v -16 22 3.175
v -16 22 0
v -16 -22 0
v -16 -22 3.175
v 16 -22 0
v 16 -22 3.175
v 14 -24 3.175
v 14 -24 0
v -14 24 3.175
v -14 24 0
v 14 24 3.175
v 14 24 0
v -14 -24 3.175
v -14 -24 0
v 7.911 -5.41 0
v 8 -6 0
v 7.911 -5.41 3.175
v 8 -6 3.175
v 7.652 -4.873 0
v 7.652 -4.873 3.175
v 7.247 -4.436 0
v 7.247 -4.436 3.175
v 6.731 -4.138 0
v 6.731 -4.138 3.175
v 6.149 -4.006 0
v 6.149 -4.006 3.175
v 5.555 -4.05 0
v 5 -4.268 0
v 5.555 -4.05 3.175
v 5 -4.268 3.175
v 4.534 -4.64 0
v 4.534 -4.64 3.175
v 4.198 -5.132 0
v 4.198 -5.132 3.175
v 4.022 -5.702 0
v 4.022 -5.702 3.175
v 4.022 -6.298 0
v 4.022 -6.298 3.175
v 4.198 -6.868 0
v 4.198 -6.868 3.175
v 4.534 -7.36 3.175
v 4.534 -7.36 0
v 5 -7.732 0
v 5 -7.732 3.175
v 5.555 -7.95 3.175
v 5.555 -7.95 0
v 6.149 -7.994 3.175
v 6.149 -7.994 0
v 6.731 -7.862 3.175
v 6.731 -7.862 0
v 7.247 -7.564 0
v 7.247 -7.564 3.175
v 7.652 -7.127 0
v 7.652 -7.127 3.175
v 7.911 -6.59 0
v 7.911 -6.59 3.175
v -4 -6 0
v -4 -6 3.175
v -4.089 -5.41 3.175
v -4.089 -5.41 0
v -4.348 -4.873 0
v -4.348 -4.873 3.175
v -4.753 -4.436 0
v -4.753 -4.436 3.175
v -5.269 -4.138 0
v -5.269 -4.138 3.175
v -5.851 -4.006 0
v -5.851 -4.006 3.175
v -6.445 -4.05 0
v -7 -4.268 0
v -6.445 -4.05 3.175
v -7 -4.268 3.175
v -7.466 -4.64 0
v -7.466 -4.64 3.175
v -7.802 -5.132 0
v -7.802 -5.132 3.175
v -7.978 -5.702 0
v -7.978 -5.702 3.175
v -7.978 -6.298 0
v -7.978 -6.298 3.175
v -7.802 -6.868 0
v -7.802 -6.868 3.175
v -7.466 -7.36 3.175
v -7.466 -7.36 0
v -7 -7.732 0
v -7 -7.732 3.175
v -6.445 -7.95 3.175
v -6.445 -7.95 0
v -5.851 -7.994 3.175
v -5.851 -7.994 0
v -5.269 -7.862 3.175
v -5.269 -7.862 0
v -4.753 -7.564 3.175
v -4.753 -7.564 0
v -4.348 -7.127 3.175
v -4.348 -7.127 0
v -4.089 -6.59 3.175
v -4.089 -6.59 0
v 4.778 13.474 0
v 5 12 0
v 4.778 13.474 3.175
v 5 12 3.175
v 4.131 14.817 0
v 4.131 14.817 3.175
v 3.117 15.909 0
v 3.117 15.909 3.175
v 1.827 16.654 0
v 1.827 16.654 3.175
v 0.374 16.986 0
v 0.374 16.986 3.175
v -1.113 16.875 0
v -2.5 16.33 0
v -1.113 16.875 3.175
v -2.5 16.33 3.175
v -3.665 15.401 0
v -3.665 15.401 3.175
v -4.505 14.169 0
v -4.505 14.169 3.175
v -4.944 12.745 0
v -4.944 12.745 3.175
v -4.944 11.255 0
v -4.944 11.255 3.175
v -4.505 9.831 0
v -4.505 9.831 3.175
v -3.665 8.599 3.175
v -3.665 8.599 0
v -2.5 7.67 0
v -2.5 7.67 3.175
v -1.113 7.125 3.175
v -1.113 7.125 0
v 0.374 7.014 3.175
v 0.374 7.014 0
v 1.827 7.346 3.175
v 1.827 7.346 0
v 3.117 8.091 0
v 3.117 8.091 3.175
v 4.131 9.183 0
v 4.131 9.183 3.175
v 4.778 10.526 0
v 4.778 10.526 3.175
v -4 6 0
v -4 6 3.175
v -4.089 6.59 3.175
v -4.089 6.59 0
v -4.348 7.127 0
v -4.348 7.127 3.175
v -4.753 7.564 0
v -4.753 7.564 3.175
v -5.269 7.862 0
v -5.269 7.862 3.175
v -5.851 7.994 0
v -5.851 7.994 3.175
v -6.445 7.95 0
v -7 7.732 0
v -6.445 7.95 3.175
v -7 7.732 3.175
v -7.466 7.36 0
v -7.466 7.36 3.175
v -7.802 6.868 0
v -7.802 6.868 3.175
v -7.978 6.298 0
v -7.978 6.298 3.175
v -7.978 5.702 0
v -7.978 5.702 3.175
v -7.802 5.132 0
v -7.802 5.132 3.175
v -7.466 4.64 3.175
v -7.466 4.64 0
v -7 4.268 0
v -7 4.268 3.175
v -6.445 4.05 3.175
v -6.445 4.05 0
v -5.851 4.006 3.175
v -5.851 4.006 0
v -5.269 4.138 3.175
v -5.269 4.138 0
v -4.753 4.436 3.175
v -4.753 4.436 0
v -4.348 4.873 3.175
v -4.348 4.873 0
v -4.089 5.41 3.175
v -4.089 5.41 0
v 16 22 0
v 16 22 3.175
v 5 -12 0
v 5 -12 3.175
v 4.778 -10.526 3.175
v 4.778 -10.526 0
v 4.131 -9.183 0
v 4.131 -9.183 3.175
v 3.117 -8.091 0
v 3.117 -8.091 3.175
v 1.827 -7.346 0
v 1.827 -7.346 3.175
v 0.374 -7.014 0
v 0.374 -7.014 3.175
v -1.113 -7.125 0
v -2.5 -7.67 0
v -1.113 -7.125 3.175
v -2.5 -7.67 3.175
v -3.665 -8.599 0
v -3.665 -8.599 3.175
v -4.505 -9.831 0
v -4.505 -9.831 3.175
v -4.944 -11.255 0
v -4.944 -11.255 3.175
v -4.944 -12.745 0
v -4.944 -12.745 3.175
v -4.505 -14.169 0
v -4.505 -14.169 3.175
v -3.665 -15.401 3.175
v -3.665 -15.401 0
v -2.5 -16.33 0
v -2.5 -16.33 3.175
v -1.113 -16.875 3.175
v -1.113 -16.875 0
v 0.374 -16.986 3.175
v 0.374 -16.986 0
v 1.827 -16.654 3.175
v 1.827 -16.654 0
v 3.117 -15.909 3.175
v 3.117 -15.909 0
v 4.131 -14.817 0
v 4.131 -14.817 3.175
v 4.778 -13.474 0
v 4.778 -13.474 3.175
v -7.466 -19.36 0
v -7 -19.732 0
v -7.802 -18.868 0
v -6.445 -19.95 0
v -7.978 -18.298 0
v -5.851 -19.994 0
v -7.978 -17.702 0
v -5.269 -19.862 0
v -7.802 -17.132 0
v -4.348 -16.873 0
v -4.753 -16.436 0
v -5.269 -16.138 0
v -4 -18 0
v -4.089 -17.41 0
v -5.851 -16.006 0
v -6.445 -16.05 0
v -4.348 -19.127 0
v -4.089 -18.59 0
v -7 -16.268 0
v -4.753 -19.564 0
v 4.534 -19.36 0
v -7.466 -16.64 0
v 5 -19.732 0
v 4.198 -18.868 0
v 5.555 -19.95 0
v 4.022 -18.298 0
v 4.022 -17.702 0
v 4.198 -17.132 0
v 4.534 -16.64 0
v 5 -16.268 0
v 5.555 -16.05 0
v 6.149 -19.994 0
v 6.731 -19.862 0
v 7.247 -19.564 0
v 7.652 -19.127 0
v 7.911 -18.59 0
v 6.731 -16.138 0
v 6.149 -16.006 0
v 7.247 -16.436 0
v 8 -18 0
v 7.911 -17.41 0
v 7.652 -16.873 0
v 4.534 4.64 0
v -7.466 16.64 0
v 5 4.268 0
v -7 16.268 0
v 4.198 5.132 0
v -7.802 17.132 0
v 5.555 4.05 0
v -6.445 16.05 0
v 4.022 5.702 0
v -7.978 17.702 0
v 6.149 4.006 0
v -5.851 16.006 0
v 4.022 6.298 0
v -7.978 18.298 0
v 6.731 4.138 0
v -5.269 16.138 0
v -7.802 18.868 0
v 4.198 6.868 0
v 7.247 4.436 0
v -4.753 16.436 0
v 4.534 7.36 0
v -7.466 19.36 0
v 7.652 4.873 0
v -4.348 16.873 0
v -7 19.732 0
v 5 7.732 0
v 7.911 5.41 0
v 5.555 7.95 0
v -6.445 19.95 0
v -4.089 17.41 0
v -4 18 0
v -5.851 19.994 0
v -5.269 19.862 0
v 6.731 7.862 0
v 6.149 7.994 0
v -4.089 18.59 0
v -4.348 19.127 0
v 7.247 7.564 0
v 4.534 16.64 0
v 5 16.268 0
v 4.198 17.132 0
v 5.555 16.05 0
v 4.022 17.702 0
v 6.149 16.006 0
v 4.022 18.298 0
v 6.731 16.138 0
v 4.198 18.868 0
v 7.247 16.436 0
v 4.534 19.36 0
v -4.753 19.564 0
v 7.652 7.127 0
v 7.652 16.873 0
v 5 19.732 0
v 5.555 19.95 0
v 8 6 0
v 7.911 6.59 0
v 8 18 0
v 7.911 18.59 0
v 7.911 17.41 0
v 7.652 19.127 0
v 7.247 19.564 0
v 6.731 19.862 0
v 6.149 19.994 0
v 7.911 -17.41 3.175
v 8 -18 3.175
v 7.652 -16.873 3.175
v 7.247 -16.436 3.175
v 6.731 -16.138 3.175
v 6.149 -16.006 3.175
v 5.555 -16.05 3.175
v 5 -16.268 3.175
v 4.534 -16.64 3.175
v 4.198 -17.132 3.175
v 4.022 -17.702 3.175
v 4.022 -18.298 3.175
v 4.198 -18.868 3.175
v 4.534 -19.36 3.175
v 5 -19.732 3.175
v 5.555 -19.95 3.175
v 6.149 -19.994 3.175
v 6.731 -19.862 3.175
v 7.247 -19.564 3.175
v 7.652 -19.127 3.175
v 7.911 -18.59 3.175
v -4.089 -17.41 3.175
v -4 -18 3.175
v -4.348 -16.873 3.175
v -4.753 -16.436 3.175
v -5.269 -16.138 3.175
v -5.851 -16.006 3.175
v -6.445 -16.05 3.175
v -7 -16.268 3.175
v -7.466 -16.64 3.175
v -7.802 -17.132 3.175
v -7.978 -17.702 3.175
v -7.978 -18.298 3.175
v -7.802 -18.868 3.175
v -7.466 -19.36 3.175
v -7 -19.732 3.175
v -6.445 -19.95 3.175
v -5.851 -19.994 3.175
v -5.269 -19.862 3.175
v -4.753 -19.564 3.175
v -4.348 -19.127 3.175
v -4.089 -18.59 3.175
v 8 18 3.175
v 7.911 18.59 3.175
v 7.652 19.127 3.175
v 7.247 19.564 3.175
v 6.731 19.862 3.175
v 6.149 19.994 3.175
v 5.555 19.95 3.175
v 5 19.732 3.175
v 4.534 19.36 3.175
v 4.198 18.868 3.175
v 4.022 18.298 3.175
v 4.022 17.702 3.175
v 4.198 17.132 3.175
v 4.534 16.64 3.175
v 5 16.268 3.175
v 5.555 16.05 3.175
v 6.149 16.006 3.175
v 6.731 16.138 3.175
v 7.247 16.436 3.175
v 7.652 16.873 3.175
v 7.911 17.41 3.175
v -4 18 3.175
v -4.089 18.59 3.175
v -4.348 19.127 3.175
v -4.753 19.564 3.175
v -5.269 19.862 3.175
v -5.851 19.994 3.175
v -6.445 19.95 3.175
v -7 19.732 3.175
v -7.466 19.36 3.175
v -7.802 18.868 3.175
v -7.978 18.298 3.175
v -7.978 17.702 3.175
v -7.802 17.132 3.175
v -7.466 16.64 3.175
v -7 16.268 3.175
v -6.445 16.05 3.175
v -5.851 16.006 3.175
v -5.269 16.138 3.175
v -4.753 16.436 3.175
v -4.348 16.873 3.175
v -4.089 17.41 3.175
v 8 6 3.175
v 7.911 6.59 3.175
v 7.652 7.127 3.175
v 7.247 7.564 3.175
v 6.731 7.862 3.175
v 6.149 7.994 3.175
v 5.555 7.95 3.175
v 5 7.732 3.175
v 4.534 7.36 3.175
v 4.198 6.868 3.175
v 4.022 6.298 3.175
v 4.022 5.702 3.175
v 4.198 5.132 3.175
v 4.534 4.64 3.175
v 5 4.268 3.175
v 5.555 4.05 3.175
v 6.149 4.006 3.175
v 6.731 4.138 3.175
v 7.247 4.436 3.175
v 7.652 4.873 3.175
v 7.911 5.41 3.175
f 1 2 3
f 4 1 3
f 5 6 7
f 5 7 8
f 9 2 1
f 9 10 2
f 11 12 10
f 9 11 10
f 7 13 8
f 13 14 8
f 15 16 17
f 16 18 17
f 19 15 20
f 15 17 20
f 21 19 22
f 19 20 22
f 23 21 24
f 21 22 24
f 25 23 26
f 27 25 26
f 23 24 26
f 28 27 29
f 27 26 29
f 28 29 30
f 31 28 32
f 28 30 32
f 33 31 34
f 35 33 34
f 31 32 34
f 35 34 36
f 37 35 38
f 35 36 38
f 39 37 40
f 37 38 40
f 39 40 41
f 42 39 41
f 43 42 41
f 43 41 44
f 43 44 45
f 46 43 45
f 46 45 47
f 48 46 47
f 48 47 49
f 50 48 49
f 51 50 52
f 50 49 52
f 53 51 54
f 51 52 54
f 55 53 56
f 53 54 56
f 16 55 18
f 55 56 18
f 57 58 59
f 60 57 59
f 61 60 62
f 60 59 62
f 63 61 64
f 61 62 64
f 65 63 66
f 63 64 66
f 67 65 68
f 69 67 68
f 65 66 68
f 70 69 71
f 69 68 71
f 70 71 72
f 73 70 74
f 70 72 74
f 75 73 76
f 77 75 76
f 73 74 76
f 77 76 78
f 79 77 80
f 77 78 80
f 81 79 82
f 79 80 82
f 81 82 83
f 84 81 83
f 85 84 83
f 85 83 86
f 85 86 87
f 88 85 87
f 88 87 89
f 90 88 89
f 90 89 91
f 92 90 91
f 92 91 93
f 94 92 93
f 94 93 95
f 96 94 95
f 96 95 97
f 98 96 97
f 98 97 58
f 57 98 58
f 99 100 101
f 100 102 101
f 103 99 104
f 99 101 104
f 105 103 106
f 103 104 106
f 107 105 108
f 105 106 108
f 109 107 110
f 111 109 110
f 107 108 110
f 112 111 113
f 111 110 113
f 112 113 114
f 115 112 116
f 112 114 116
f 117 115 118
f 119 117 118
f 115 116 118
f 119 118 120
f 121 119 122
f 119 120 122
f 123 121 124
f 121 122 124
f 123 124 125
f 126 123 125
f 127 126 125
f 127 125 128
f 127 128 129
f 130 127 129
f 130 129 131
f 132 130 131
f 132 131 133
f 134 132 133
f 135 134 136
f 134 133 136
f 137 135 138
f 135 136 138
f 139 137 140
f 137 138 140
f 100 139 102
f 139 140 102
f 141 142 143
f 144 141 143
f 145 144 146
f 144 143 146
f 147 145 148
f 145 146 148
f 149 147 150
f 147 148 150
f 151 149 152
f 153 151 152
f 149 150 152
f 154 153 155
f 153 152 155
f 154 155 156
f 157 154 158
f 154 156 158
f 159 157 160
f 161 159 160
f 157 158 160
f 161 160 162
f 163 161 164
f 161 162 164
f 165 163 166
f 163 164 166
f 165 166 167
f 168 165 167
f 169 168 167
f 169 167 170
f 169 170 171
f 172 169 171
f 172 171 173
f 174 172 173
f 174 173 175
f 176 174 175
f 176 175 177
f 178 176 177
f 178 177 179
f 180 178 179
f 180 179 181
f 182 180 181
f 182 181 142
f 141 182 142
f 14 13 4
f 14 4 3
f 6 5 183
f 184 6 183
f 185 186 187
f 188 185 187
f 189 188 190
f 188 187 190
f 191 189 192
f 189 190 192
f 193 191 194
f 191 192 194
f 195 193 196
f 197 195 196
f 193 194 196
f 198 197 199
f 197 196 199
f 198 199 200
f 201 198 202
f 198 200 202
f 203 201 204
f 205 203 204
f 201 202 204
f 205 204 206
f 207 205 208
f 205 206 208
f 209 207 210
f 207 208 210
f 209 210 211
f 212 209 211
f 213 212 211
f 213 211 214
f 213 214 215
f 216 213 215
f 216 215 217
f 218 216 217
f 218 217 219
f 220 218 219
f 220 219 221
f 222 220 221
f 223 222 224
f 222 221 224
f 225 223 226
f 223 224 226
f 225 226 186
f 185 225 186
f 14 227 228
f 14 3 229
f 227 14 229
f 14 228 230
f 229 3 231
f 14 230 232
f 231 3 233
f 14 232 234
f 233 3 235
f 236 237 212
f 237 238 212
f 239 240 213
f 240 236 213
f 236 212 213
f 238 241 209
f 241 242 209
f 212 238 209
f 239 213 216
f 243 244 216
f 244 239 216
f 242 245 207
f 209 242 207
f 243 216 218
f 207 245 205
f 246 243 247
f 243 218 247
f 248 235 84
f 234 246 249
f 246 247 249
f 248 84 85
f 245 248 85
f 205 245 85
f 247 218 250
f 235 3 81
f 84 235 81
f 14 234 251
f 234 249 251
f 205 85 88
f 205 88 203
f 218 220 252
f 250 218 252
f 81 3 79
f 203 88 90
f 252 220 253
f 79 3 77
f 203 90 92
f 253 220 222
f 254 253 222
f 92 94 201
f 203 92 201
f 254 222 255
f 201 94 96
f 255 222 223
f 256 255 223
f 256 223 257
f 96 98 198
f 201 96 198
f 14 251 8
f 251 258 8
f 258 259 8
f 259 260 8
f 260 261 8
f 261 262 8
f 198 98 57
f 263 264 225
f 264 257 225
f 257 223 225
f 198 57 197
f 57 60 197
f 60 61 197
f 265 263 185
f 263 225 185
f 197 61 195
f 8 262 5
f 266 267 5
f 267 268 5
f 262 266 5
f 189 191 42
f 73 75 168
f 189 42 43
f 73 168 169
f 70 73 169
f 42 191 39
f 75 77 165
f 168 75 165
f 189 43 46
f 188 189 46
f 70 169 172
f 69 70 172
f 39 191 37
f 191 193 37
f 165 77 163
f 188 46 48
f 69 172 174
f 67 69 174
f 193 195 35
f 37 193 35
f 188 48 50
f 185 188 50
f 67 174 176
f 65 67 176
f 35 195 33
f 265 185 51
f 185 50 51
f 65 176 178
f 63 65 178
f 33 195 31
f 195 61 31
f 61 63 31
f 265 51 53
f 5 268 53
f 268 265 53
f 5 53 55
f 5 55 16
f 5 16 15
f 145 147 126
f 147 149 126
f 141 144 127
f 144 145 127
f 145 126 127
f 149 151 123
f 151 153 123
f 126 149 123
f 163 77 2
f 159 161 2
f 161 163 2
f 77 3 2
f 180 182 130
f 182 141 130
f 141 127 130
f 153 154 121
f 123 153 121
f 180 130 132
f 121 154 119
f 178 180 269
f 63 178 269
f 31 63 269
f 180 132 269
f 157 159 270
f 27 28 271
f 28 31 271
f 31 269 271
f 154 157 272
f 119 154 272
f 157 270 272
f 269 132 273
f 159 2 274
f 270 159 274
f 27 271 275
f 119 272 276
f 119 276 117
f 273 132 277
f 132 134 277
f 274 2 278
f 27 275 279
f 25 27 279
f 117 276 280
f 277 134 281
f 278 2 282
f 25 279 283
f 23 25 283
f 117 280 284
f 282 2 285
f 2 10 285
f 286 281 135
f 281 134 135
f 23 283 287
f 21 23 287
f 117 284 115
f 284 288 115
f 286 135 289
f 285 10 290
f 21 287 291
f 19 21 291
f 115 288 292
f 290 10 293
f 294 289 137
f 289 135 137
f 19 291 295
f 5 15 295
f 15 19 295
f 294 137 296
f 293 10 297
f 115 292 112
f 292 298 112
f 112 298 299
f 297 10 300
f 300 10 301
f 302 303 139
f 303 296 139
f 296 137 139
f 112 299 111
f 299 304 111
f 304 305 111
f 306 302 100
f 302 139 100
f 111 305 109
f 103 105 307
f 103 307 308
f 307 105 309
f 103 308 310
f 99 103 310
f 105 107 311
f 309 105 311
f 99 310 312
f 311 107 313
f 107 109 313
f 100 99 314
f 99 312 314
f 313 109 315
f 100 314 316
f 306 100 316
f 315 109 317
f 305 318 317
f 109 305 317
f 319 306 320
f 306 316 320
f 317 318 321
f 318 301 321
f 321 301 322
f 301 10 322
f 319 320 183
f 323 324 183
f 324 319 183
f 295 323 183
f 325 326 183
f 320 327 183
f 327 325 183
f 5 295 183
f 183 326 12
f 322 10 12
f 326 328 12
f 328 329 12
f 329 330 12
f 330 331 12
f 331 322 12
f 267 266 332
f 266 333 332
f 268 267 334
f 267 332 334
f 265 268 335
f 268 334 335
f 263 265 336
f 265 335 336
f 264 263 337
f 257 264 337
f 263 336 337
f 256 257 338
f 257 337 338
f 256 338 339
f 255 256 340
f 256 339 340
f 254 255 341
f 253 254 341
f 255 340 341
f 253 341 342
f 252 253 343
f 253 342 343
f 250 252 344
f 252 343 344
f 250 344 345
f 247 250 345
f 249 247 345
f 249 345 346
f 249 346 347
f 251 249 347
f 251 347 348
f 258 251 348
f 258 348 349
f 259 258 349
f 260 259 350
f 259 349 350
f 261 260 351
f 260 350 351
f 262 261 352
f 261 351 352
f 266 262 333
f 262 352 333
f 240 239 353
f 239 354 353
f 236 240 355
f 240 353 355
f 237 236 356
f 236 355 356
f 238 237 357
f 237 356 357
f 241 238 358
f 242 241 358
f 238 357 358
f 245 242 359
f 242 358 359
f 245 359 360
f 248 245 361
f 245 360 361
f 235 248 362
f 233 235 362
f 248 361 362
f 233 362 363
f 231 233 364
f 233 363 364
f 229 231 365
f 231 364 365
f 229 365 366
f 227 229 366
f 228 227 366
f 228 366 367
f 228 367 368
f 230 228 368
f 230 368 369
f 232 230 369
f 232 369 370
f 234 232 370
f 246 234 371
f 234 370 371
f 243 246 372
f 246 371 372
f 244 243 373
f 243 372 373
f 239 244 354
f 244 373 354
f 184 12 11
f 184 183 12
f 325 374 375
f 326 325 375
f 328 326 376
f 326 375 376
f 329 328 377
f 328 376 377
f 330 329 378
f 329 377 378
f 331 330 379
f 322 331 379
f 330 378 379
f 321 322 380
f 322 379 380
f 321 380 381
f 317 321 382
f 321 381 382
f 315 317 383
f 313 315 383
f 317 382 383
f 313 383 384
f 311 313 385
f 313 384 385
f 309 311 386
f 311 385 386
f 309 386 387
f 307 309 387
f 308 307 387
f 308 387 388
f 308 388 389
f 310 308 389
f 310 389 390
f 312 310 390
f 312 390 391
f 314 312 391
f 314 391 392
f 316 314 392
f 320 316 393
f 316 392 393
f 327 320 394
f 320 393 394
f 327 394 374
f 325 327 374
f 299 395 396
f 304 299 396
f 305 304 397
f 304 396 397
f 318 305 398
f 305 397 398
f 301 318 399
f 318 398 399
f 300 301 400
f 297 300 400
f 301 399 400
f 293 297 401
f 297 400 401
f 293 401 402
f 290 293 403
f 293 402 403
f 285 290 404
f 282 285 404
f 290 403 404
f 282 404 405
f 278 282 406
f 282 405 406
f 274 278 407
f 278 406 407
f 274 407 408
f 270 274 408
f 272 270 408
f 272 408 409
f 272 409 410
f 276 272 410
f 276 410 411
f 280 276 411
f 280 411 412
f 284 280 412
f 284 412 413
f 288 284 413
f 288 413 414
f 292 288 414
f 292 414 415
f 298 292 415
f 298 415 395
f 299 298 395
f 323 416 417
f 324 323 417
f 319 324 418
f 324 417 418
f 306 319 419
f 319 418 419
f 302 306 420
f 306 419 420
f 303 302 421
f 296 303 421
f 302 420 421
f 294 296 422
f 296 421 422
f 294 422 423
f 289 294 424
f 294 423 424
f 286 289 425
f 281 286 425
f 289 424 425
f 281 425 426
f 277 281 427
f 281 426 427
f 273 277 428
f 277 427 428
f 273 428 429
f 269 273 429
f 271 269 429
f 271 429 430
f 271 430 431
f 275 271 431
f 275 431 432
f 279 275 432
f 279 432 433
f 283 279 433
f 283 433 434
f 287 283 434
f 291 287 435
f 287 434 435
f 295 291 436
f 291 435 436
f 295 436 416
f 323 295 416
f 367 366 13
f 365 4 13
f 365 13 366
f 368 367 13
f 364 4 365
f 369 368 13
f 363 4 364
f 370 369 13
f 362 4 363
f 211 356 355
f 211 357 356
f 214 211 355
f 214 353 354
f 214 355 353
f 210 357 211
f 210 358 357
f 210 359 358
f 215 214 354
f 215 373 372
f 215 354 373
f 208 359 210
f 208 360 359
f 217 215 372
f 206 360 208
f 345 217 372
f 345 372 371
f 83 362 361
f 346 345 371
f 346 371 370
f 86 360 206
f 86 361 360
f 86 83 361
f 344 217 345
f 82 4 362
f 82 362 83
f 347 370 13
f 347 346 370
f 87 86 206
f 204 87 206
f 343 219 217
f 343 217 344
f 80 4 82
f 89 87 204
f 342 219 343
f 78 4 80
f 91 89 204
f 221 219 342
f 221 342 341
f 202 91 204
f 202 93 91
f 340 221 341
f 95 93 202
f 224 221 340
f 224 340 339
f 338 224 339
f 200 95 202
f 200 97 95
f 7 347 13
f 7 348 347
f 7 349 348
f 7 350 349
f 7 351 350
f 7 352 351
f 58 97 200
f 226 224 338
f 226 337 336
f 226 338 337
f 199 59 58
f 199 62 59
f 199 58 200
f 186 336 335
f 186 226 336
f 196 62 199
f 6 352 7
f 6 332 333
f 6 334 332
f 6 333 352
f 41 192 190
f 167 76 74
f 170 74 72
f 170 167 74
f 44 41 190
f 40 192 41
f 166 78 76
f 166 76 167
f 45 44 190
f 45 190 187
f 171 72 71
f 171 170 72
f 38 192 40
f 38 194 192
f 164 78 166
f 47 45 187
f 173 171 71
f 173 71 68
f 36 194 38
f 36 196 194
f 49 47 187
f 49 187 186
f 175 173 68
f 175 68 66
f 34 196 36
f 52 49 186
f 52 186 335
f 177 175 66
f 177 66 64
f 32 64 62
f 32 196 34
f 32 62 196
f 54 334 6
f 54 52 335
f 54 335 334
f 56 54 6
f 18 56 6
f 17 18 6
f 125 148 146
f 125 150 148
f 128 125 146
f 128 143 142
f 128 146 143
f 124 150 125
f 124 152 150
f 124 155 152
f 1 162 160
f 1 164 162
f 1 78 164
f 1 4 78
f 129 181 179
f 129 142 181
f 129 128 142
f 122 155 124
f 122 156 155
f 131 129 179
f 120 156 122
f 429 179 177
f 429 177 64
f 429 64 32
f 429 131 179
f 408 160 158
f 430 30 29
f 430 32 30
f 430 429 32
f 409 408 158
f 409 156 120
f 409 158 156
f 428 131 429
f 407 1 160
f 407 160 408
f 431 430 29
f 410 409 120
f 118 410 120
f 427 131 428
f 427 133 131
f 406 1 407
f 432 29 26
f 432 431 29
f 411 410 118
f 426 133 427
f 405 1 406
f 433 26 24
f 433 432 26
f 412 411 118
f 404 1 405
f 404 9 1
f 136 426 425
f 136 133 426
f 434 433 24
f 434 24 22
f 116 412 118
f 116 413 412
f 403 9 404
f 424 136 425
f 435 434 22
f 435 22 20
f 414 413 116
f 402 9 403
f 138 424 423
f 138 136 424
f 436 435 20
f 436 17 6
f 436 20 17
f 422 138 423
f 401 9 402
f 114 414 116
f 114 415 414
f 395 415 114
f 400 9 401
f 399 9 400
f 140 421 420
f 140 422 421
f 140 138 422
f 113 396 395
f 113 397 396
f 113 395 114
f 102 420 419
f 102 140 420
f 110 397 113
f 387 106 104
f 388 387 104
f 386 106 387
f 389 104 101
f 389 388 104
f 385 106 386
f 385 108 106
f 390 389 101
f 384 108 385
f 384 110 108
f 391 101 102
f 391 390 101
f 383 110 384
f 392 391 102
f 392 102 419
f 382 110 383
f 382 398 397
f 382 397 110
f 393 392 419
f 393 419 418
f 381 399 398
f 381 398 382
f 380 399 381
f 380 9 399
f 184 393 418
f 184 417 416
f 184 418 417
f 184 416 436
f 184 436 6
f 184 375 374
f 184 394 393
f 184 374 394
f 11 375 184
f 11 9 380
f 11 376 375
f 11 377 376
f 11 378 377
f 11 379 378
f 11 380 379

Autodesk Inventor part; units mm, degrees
ref_plane "YZ Plane" through (0, 0, 0) normal (1, 0, 0) x (0, 1, 0)
ref_plane "XZ Plane" through (0, 0, 0) normal (0, 1, 0) x (-1, 0, 0)
ref_plane "XY Plane" through (0, 0, 0) normal (0, 0, 1) x (1, 0, 0)
sketch "Sketch1" plane through (0, 0, 0) normal (0, 0, 1) x (1, 0, 0)
  line L0 (-16, -24) -> (16, -24)
  line L1 (16, -24) -> (16, 24)
  line L2 (16, 24) -> (-16, 24)
  line L3 (-16, 24) -> (-16, -24)
  line L4 (-16, -24) -> (16, 24) construction
  line L5 (16, -24) -> (-16, 24) construction
  point P0 (0, 0)
  dimension "d0" = 32
  dimension "d1" = 48
extrude "Extrusion1" add sketch "Sketch1" along normal blind 3.175
sketch "Sketch2" plane through (0, 0, 3.175) normal (0, 0, 1) x (1, 0, 0)
  circle A0 centre (0, -12) radius 5
  line L0 (-16, 24) -> (-16, -24) construction
  line L1 (-16, 0) -> (16, 0) construction
  line L2 (16, -24) -> (16, 24) construction
  circle A1 centre (-6, -6) radius 2
  circle A2 centre (-6, -18) radius 2
  circle A3 centre (6, -18) radius 2
  circle A4 centre (6, -6) radius 2
  circle A5 centre (0, 12) radius 5
  circle A6 centre (-6, 6) radius 2
  circle A7 centre (-6, 18) radius 2
  circle A8 centre (6, 18) radius 2
  circle A9 centre (6, 6) radius 2
  point P0 (0, 0)
  dimension "d4" = 10
  dimension "d5" = 12
  dimension "d6" = 4
  dimension "d7" = 6
  dimension "d8" = 6
  dimension "d11" = 360
extrude "Extrusion2" cut sketch "Sketch2" against normal through all
chamfer "Chamfer1" distance 2 angle 45 4 edges at (16, 24, 1.5875) (-16, 24, 1.5875) (16, -24, 1.5875) (-16, -24, 1.5875)
properties part number "UpperLayerSupportPlate"
